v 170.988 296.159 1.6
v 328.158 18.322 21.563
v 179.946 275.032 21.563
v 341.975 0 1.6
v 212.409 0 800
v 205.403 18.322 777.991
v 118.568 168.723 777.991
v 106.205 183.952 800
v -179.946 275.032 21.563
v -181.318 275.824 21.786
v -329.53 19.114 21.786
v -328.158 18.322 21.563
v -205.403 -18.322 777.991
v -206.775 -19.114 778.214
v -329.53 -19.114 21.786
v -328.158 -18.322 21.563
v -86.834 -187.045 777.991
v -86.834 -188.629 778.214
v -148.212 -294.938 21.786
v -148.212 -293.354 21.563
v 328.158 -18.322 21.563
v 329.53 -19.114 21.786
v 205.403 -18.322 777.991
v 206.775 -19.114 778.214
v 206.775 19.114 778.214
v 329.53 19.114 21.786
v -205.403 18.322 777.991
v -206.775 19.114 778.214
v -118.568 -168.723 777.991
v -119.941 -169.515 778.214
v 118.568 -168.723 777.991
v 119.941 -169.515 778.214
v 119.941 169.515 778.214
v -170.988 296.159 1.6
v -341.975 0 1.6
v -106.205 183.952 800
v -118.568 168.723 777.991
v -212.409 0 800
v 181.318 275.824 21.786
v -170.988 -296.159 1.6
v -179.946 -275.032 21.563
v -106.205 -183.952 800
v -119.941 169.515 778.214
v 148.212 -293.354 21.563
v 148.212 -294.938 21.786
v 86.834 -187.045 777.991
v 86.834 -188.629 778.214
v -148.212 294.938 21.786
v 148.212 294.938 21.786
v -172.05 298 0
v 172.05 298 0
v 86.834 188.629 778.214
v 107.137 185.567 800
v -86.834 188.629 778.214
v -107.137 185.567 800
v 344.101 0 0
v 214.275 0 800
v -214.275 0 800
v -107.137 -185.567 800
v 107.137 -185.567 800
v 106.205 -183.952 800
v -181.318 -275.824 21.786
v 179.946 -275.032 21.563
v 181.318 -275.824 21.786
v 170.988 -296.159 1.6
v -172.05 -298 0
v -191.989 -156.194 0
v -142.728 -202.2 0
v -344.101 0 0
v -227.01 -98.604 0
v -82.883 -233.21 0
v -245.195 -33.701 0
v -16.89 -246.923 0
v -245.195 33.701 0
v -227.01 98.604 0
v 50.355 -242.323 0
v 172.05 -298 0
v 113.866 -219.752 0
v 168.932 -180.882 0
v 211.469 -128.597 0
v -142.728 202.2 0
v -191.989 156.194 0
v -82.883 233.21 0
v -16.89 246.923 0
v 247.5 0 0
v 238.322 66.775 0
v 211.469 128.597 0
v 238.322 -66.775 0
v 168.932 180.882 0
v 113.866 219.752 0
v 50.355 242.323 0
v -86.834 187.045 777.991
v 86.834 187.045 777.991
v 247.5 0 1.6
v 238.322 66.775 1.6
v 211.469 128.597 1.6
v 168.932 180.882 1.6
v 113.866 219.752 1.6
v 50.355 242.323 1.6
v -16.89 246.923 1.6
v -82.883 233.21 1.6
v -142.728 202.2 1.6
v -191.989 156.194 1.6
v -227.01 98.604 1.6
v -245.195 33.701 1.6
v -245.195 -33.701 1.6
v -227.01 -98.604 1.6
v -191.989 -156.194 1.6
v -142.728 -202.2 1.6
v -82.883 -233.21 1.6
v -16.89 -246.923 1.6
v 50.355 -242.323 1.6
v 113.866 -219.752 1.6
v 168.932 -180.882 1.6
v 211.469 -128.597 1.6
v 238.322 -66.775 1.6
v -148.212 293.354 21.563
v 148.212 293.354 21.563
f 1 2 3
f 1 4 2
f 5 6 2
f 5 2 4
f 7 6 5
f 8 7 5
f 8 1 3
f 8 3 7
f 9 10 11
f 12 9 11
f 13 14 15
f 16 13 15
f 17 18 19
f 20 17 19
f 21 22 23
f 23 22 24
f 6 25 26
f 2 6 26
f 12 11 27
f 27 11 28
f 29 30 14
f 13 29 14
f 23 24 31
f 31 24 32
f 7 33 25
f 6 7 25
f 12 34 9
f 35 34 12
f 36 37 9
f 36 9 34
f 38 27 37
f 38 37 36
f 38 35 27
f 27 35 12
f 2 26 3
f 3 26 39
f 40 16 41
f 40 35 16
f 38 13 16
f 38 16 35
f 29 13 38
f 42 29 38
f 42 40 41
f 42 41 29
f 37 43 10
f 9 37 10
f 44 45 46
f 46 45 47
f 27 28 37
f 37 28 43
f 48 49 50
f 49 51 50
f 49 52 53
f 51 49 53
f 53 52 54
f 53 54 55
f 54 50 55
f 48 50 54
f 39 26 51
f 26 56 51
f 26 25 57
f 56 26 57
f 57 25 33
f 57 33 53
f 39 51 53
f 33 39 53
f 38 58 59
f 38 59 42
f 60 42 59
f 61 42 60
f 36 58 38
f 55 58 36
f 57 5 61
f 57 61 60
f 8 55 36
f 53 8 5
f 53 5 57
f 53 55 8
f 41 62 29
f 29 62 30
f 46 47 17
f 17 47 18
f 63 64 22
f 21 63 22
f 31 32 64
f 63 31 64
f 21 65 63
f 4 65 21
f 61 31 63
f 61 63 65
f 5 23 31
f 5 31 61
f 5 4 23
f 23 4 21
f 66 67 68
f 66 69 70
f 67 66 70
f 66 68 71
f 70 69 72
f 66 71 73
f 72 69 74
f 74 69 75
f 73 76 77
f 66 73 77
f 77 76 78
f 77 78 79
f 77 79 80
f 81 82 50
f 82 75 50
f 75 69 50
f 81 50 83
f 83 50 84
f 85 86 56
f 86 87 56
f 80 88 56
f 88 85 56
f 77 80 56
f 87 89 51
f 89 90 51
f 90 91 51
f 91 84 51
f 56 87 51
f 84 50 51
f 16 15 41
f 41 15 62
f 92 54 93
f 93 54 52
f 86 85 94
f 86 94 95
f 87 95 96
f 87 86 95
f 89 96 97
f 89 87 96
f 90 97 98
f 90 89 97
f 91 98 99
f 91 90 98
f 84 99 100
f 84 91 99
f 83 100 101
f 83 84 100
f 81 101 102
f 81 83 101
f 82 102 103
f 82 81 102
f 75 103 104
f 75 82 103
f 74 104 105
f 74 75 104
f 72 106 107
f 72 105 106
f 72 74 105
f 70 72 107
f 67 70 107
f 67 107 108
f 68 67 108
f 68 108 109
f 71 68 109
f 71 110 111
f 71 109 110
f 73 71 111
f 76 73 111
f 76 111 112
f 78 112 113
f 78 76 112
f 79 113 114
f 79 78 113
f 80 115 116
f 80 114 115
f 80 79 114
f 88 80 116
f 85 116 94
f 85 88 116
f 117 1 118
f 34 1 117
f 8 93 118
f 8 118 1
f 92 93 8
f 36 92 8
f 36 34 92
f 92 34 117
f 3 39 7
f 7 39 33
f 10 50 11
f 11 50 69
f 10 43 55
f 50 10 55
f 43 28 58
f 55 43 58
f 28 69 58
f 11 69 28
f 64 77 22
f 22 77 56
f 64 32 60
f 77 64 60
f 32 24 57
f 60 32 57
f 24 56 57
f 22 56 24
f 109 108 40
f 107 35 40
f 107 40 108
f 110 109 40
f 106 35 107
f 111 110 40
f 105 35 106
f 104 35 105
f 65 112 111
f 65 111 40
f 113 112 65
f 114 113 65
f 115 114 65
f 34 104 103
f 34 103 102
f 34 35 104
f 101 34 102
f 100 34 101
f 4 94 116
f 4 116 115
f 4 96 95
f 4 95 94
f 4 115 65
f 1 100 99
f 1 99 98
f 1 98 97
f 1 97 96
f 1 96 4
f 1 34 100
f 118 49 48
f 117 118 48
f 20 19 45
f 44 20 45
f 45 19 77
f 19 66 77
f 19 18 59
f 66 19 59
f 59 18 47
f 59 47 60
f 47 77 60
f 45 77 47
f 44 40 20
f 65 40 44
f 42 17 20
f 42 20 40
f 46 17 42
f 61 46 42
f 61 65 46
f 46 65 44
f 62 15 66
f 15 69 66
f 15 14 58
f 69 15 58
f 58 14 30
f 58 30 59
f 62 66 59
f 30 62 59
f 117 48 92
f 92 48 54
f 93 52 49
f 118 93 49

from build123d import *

# Parameters (mm, degrees)
F1_DEPTH  = 800
F1_TAPER  = 8
F2_T      = -1.6
F3_R      = 247.5
F4_DEPTH  = 25
F6_DEPTH  = 25
F8_DEPTH  = 25
F10_DEPTH = 25
F12_DEPTH = 25
F14_DEPTH = 25
F16_DEPTH = 25


with BuildPart() as f1:
    # F0 (on Top) → F1 (new body)
    with BuildSketch(Plane.XY):
        Polygon((172.0503802185, 298), (-172.0503802185, 298), (-344.100760437, 0), (-172.0503802185, -298), (172.0503802185, -298), (344.100760437, 0), align=None)
    extrude(amount=F1_DEPTH, taper=F1_TAPER)

    # F2
    f2_openings = [f1.faces().sort_by_distance(p)[0] for p in [
        (0, 0, 800),
    ]]
    offset(amount=F2_T, openings=f2_openings)

    # F3 (on face) → F4 (cut)
    with BuildSketch(Plane.XY):
        Circle(F3_R)
    extrude(amount=F4_DEPTH, mode=Mode.SUBTRACT)

    # F5 (on face) → F6 (cut)
    with BuildSketch(Plane(origin=(0, -292.2279926948, 41.0699660167), x_dir=(1, 0, 0), z_dir=(0, -0.9902680687, 0.139173101))):
        Polygon((-86.8341790619, 744.3884739288), (-148.2117384586, -19.4735840861), (148.2117384586, -19.4735840861), (86.8341790619, 744.3884739288), align=None)
    extrude(amount=-F6_DEPTH, mode=Mode.SUBTRACT)

    # F7 (on face) → F8 (cut)
    with BuildSketch(Plane(origin=(-253.0768653706, -146.1139963474, 41.0699660167), x_dir=(0.4887402152, -0.8688166021, -0.0793140218), z_dir=(-0.8575973041, -0.4951340344, 0.139173101))):
        Polygon((-146.1758796985, 735.0421667944), (-146.1758796985, -31.2818172178), (149.2952941729, -7.540227576), (26.934543851, 748.9518710297), align=None)
    extrude(amount=-F8_DEPTH, mode=Mode.SUBTRACT)

    # F9 (on face) → F10 (cut)
    with BuildSketch(Plane(origin=(-253.0768653706, 146.1139963474, 41.0699660167), x_dir=(-0.4887402152, -0.8688166021, 0.0793140218), z_dir=(-0.8575973041, 0.4951340344, 0.139173101))):
        Polygon((146.1758796985, 735.0421667944), (-26.934543851, 748.9518710297), (-149.2952941729, -7.540227576), (146.1758796985, -31.2818172178), align=None)
    extrude(amount=-F10_DEPTH, mode=Mode.SUBTRACT)

    # F11 (on face) → F12 (cut)
    with BuildSketch(Plane(origin=(0, 292.2279926948, 41.0699660167), x_dir=(-1, 0, 0), z_dir=(0, 0.9902680687, 0.139173101))):
        Polygon((-148.2117384586, -19.4735840861), (148.2117384586, -19.4735840861), (86.8341790619, 744.3884739288), (-86.8341790619, 744.3884739288), align=None)
    extrude(amount=-F12_DEPTH, mode=Mode.SUBTRACT)

    # F13 (on face) → F14 (cut)
    with BuildSketch(Plane(origin=(253.0768653706, 146.1139963474, 41.0699660167), x_dir=(-0.4887402152, 0.8688166021, -0.0793140218), z_dir=(0.8575973041, 0.4951340344, 0.139173101))):
        Polygon((26.934543851, 748.9518710297), (-146.1758796985, 735.0421667944), (-146.1758796985, -31.2818172178), (149.2952941729, -7.540227576), align=None)
    extrude(amount=-F14_DEPTH, mode=Mode.SUBTRACT)

    # F15 (on face) → F16 (cut)
    with BuildSketch(Plane(origin=(253.0768653706, -146.1139963474, 41.0699660167), x_dir=(0.4887402152, 0.8688166021, 0.0793140218), z_dir=(0.8575973041, -0.4951340344, 0.139173101))):
        Polygon((-26.934543851, 748.9518710297), (-149.2952941729, -7.540227576), (146.1758796985, -31.2818172178), (146.1758796985, 735.0421667944), align=None)
    extrude(amount=-F16_DEPTH, mode=Mode.SUBTRACT)


solid = f1.part
